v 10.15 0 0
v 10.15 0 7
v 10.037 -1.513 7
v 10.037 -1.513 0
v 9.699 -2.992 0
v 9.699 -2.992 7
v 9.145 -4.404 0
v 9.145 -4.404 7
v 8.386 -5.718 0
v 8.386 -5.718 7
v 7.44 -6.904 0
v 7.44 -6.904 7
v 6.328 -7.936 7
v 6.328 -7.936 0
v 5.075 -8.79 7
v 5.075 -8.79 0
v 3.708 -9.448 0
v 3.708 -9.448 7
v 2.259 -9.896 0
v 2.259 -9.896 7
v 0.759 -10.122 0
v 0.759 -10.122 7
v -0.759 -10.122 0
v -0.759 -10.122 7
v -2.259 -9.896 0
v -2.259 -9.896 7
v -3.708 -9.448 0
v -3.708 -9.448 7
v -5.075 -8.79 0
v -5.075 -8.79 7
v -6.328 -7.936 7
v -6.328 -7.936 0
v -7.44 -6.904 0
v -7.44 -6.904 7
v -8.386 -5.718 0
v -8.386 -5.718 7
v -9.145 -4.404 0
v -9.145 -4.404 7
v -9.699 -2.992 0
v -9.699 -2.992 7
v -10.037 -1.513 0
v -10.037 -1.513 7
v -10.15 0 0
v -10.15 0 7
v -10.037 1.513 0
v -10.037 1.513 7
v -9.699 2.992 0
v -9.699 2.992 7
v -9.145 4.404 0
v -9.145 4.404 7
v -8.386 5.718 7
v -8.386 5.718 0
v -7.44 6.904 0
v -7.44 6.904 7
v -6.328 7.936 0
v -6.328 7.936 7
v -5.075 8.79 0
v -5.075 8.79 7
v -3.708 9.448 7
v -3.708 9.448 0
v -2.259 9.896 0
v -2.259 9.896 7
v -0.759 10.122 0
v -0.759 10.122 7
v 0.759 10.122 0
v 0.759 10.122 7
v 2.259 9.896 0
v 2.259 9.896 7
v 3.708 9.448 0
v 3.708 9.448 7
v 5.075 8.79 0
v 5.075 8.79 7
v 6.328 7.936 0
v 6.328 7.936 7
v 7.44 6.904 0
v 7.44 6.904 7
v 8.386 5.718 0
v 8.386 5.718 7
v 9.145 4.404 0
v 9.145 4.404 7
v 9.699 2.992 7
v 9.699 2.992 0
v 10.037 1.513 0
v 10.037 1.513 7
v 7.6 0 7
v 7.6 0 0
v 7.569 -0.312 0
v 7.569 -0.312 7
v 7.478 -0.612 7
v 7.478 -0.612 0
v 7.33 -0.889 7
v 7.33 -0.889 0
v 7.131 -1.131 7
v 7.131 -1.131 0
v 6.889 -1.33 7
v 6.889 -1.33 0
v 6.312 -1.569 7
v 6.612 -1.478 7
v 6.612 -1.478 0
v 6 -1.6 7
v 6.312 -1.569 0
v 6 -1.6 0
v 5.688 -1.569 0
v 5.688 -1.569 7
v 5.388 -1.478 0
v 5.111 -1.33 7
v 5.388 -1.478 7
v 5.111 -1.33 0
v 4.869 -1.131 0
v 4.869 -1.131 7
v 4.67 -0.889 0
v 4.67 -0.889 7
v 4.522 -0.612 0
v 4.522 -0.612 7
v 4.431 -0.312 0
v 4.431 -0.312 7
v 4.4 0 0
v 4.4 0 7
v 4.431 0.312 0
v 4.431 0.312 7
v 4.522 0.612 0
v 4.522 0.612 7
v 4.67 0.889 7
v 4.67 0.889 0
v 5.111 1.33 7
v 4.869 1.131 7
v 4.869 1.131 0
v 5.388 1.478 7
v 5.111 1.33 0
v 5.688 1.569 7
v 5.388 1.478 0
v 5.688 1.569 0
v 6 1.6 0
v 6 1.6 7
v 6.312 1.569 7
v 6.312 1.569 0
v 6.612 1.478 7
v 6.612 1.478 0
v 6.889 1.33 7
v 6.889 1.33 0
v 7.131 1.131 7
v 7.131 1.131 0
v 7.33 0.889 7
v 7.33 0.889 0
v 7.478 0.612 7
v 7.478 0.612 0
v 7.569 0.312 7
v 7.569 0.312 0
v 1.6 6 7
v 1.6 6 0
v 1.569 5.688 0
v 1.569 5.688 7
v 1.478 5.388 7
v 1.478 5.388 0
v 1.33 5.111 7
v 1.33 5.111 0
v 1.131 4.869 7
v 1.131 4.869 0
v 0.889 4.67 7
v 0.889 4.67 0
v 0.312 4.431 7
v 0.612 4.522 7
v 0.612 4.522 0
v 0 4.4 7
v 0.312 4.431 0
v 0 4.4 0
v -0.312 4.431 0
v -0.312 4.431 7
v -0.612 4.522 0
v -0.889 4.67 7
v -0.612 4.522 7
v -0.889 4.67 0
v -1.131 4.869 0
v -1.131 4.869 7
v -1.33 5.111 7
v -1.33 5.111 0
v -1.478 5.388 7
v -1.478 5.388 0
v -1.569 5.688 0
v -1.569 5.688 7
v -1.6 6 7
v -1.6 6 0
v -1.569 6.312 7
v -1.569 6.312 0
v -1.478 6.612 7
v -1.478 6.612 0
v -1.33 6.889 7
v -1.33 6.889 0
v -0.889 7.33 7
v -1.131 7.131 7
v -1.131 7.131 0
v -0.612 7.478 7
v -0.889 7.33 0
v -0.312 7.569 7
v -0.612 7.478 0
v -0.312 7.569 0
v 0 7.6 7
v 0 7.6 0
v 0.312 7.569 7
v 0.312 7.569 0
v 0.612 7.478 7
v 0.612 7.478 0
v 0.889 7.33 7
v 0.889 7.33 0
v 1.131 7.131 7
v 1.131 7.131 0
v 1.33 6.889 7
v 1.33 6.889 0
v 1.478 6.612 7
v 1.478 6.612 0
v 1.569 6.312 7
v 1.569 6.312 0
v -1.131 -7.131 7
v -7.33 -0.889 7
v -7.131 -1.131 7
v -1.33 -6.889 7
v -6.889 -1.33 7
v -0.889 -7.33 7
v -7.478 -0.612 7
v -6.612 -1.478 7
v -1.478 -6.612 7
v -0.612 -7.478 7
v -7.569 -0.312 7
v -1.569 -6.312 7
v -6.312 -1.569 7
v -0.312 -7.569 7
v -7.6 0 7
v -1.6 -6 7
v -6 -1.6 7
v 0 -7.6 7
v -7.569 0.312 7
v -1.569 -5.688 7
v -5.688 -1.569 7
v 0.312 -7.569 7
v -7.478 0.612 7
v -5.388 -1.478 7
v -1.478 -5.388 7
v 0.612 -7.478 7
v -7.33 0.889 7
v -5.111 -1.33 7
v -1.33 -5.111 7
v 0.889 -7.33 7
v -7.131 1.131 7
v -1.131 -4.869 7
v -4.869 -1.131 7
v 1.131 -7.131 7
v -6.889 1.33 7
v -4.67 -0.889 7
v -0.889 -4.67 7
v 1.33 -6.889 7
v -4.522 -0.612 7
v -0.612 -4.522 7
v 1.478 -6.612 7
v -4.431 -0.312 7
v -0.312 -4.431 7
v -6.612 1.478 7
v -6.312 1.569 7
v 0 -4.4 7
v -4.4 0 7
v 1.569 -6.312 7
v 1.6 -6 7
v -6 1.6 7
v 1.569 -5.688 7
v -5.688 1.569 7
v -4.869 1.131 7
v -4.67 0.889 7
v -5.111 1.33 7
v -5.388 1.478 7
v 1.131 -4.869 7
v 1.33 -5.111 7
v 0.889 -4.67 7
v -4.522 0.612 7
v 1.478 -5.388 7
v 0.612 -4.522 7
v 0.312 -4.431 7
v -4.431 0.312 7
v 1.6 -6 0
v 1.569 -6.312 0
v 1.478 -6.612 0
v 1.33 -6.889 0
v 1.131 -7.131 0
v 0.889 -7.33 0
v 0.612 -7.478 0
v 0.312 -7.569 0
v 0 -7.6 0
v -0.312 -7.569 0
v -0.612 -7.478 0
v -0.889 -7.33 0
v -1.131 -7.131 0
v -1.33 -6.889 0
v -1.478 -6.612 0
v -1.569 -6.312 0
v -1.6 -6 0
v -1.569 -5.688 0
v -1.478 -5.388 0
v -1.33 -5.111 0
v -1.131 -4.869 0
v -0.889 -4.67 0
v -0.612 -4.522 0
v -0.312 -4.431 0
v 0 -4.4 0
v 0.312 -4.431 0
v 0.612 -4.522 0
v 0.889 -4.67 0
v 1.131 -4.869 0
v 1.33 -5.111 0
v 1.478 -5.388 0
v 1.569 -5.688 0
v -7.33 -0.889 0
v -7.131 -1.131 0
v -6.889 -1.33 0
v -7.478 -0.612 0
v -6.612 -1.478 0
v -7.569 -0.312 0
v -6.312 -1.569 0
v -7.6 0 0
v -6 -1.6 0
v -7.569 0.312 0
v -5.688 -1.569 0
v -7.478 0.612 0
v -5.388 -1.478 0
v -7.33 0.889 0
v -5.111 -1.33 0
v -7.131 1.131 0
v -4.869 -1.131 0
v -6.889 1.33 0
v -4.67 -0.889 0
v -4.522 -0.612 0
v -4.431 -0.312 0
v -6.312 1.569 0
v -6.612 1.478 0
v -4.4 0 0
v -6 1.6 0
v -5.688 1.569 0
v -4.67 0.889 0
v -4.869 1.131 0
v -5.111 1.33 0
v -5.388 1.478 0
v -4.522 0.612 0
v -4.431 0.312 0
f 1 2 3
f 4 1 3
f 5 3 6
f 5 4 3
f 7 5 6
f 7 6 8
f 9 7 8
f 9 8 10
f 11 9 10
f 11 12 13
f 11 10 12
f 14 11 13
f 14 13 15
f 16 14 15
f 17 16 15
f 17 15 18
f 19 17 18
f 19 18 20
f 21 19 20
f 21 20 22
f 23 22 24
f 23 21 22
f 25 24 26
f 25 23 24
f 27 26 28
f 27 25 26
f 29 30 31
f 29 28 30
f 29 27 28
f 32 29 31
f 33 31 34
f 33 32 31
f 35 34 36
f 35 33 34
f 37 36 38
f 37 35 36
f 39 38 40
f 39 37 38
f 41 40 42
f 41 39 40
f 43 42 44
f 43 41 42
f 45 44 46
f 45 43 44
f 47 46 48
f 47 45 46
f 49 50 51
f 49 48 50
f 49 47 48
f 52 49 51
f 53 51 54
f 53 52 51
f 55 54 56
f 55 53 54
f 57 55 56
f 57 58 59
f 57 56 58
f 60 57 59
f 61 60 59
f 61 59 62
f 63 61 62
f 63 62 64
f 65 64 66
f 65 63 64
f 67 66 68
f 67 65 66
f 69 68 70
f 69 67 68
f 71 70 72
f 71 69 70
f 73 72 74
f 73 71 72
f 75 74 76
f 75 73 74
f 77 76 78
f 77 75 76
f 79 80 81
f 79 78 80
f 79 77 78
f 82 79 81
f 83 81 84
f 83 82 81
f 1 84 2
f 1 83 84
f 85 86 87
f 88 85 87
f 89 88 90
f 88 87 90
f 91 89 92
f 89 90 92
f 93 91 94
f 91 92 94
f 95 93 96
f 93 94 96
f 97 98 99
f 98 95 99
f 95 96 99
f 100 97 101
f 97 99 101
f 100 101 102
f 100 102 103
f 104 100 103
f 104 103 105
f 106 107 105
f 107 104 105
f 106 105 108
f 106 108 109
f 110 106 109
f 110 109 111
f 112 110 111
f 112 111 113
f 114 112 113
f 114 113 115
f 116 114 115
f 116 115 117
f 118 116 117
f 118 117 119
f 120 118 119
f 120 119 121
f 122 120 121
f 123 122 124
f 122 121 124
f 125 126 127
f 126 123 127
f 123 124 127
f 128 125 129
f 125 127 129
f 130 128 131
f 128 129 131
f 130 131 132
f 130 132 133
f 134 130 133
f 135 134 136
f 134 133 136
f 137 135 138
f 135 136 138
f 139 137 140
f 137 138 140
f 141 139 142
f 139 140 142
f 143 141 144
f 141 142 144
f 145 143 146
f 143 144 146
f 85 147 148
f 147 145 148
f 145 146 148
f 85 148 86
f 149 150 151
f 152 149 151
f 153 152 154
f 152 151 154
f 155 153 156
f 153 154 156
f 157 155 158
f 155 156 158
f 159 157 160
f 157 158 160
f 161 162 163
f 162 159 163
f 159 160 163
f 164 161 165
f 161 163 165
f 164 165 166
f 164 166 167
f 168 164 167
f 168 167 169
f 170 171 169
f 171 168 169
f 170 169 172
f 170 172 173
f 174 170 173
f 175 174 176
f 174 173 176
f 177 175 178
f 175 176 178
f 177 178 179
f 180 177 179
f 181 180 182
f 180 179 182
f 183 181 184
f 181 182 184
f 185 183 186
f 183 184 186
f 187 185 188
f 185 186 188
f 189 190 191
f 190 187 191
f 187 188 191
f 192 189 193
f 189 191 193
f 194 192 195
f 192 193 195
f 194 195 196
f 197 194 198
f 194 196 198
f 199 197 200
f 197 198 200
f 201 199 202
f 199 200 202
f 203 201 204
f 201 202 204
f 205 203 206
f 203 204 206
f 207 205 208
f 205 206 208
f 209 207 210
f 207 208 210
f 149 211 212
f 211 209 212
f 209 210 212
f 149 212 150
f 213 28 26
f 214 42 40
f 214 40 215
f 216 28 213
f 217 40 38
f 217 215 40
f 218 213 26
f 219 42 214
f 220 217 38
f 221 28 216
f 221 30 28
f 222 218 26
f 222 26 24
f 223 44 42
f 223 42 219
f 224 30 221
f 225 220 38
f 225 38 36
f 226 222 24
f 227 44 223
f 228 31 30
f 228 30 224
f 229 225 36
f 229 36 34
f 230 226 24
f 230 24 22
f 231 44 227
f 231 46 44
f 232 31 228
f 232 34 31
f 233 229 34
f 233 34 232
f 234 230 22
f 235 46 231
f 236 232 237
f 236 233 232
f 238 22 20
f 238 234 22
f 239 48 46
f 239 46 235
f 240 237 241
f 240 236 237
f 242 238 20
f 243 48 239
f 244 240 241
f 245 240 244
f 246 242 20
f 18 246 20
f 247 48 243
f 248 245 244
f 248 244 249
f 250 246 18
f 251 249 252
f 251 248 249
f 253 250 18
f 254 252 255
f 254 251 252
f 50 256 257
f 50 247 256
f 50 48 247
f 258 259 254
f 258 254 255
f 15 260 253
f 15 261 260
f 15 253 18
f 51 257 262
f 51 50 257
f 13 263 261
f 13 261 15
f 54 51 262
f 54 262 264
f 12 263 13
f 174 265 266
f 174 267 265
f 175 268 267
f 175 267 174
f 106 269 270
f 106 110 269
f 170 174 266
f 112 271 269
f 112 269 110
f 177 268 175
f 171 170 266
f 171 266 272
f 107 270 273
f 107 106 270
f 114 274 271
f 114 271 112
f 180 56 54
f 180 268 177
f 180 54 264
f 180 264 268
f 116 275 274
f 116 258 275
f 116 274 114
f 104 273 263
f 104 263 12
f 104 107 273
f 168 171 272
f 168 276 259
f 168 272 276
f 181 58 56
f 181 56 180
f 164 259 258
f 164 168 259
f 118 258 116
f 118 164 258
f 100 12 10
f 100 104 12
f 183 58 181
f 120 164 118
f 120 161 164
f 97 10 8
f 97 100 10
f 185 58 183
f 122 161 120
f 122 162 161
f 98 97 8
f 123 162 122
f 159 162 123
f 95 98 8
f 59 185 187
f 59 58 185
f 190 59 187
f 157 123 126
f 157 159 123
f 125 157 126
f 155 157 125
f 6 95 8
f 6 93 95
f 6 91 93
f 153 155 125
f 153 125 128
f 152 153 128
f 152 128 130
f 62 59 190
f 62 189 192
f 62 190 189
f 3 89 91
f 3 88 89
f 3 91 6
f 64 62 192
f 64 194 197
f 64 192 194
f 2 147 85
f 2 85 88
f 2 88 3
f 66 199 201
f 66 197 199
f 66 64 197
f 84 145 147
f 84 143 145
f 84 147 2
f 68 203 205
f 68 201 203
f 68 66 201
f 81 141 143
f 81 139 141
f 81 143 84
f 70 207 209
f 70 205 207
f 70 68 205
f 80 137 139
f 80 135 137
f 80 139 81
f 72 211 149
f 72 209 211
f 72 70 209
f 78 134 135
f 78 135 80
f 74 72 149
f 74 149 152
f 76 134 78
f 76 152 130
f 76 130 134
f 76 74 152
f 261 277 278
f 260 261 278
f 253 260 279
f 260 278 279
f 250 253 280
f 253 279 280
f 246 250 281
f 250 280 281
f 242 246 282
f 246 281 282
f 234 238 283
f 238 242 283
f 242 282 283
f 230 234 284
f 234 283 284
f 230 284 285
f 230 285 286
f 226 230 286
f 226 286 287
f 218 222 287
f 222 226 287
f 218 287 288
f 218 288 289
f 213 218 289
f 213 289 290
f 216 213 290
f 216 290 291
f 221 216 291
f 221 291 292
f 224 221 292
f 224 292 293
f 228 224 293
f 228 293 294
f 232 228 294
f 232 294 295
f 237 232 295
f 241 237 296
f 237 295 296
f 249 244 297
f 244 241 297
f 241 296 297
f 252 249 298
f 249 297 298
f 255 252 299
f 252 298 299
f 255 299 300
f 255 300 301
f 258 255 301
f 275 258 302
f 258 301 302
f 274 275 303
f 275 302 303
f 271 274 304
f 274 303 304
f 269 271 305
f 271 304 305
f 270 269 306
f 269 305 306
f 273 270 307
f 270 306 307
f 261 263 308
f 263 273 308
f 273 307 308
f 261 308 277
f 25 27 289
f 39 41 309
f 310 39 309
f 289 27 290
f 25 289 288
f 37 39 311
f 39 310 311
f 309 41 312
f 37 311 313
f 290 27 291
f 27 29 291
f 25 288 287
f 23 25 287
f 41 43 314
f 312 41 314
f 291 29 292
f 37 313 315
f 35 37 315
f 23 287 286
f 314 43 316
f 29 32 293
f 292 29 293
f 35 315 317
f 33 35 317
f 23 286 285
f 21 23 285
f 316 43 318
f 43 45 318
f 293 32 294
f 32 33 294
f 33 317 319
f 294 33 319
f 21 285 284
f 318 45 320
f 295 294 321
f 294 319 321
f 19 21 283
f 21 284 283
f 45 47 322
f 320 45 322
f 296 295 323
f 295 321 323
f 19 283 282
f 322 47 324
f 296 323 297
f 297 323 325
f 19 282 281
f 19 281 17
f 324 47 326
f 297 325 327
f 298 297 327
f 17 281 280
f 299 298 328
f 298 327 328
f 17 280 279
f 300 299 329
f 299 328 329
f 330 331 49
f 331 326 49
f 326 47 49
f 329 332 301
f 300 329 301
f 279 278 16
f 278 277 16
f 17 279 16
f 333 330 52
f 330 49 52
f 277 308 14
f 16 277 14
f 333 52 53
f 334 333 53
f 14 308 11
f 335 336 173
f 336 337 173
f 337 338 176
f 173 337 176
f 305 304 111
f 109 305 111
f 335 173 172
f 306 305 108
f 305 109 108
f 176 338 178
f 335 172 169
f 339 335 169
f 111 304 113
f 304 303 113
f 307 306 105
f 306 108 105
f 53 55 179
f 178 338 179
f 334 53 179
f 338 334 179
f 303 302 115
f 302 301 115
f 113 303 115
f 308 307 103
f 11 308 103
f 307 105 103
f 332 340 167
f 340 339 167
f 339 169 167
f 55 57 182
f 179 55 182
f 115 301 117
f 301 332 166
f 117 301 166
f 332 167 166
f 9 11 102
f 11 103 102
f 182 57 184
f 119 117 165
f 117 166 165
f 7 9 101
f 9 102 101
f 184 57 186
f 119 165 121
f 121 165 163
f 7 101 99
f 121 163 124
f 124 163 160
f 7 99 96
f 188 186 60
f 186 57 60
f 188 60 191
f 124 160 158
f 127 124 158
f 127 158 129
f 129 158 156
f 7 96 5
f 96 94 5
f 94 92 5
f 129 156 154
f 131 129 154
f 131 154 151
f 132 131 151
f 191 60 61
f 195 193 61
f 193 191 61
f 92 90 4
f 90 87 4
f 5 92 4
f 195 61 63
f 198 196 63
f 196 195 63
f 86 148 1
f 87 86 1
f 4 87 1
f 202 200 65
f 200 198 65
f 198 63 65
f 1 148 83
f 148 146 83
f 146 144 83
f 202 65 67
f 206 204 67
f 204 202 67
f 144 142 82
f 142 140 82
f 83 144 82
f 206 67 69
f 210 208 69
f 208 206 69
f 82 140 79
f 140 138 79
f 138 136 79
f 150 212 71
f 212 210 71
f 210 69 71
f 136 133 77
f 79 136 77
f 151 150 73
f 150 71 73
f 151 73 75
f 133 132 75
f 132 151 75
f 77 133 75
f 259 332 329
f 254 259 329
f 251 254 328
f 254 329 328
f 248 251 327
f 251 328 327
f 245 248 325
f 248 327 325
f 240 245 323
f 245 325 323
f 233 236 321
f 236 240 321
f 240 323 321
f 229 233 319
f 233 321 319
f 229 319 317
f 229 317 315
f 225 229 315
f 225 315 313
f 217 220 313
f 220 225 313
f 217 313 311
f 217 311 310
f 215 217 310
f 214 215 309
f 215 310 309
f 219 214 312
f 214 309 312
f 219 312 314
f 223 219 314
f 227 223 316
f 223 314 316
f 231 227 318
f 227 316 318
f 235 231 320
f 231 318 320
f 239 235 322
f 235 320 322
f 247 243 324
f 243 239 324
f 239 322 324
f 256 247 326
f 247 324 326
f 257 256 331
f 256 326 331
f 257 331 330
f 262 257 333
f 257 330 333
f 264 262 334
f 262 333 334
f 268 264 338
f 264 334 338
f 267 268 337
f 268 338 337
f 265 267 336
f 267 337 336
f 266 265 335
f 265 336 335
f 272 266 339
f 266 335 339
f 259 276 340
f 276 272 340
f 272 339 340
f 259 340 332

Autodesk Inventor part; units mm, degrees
ref_plane "YZ Plane" through (0, 0, 0) normal (1, 0, 0) x (0, 1, 0)
ref_plane "XZ Plane" through (0, 0, 0) normal (0, 1, 0) x (-1, 0, 0)
ref_plane "XY Plane" through (0, 0, 0) normal (0, 0, 1) x (1, 0, 0)
sketch "스케치1" plane through (0, 0, 0) normal (0, 0, 1) x (1, 0, 0)
  circle A0 centre (0, 0) radius 10.15
  line L0 (0, 0) -> (-6, 0)
  circle A1 centre (-6, 0) radius 1.6
  line L1 (0, 0) -> (0, 6)
  circle A2 centre (0, 6) radius 1.6
  line L2 (0, 0) -> (0, -6)
  circle A3 centre (0, -6) radius 1.6
  line L3 (0, 0) -> (6, 0)
  circle A4 centre (6, 0) radius 1.6
  dimension "d2" = 6
  dimension "d3" = 3.2
  dimension "d7" = 6
  dimension "d8" = 3.2
  dimension "d9" = 6
  dimension "d10" = 3.2
  dimension "d11" = 6
  dimension "d12" = 3.2
  dimension "d13" = 20.3
extrude "돌출1" add sketch "스케치1" along normal blind 6
thicken "두껍게 하기1" operation add thickness 1 both sides no extend neighbours no toward (0, 0, 1) faces at (-0.0643, -1.4706, 6)
equation "\"d5\" = d7"
properties part number "Test_ShaftB"
